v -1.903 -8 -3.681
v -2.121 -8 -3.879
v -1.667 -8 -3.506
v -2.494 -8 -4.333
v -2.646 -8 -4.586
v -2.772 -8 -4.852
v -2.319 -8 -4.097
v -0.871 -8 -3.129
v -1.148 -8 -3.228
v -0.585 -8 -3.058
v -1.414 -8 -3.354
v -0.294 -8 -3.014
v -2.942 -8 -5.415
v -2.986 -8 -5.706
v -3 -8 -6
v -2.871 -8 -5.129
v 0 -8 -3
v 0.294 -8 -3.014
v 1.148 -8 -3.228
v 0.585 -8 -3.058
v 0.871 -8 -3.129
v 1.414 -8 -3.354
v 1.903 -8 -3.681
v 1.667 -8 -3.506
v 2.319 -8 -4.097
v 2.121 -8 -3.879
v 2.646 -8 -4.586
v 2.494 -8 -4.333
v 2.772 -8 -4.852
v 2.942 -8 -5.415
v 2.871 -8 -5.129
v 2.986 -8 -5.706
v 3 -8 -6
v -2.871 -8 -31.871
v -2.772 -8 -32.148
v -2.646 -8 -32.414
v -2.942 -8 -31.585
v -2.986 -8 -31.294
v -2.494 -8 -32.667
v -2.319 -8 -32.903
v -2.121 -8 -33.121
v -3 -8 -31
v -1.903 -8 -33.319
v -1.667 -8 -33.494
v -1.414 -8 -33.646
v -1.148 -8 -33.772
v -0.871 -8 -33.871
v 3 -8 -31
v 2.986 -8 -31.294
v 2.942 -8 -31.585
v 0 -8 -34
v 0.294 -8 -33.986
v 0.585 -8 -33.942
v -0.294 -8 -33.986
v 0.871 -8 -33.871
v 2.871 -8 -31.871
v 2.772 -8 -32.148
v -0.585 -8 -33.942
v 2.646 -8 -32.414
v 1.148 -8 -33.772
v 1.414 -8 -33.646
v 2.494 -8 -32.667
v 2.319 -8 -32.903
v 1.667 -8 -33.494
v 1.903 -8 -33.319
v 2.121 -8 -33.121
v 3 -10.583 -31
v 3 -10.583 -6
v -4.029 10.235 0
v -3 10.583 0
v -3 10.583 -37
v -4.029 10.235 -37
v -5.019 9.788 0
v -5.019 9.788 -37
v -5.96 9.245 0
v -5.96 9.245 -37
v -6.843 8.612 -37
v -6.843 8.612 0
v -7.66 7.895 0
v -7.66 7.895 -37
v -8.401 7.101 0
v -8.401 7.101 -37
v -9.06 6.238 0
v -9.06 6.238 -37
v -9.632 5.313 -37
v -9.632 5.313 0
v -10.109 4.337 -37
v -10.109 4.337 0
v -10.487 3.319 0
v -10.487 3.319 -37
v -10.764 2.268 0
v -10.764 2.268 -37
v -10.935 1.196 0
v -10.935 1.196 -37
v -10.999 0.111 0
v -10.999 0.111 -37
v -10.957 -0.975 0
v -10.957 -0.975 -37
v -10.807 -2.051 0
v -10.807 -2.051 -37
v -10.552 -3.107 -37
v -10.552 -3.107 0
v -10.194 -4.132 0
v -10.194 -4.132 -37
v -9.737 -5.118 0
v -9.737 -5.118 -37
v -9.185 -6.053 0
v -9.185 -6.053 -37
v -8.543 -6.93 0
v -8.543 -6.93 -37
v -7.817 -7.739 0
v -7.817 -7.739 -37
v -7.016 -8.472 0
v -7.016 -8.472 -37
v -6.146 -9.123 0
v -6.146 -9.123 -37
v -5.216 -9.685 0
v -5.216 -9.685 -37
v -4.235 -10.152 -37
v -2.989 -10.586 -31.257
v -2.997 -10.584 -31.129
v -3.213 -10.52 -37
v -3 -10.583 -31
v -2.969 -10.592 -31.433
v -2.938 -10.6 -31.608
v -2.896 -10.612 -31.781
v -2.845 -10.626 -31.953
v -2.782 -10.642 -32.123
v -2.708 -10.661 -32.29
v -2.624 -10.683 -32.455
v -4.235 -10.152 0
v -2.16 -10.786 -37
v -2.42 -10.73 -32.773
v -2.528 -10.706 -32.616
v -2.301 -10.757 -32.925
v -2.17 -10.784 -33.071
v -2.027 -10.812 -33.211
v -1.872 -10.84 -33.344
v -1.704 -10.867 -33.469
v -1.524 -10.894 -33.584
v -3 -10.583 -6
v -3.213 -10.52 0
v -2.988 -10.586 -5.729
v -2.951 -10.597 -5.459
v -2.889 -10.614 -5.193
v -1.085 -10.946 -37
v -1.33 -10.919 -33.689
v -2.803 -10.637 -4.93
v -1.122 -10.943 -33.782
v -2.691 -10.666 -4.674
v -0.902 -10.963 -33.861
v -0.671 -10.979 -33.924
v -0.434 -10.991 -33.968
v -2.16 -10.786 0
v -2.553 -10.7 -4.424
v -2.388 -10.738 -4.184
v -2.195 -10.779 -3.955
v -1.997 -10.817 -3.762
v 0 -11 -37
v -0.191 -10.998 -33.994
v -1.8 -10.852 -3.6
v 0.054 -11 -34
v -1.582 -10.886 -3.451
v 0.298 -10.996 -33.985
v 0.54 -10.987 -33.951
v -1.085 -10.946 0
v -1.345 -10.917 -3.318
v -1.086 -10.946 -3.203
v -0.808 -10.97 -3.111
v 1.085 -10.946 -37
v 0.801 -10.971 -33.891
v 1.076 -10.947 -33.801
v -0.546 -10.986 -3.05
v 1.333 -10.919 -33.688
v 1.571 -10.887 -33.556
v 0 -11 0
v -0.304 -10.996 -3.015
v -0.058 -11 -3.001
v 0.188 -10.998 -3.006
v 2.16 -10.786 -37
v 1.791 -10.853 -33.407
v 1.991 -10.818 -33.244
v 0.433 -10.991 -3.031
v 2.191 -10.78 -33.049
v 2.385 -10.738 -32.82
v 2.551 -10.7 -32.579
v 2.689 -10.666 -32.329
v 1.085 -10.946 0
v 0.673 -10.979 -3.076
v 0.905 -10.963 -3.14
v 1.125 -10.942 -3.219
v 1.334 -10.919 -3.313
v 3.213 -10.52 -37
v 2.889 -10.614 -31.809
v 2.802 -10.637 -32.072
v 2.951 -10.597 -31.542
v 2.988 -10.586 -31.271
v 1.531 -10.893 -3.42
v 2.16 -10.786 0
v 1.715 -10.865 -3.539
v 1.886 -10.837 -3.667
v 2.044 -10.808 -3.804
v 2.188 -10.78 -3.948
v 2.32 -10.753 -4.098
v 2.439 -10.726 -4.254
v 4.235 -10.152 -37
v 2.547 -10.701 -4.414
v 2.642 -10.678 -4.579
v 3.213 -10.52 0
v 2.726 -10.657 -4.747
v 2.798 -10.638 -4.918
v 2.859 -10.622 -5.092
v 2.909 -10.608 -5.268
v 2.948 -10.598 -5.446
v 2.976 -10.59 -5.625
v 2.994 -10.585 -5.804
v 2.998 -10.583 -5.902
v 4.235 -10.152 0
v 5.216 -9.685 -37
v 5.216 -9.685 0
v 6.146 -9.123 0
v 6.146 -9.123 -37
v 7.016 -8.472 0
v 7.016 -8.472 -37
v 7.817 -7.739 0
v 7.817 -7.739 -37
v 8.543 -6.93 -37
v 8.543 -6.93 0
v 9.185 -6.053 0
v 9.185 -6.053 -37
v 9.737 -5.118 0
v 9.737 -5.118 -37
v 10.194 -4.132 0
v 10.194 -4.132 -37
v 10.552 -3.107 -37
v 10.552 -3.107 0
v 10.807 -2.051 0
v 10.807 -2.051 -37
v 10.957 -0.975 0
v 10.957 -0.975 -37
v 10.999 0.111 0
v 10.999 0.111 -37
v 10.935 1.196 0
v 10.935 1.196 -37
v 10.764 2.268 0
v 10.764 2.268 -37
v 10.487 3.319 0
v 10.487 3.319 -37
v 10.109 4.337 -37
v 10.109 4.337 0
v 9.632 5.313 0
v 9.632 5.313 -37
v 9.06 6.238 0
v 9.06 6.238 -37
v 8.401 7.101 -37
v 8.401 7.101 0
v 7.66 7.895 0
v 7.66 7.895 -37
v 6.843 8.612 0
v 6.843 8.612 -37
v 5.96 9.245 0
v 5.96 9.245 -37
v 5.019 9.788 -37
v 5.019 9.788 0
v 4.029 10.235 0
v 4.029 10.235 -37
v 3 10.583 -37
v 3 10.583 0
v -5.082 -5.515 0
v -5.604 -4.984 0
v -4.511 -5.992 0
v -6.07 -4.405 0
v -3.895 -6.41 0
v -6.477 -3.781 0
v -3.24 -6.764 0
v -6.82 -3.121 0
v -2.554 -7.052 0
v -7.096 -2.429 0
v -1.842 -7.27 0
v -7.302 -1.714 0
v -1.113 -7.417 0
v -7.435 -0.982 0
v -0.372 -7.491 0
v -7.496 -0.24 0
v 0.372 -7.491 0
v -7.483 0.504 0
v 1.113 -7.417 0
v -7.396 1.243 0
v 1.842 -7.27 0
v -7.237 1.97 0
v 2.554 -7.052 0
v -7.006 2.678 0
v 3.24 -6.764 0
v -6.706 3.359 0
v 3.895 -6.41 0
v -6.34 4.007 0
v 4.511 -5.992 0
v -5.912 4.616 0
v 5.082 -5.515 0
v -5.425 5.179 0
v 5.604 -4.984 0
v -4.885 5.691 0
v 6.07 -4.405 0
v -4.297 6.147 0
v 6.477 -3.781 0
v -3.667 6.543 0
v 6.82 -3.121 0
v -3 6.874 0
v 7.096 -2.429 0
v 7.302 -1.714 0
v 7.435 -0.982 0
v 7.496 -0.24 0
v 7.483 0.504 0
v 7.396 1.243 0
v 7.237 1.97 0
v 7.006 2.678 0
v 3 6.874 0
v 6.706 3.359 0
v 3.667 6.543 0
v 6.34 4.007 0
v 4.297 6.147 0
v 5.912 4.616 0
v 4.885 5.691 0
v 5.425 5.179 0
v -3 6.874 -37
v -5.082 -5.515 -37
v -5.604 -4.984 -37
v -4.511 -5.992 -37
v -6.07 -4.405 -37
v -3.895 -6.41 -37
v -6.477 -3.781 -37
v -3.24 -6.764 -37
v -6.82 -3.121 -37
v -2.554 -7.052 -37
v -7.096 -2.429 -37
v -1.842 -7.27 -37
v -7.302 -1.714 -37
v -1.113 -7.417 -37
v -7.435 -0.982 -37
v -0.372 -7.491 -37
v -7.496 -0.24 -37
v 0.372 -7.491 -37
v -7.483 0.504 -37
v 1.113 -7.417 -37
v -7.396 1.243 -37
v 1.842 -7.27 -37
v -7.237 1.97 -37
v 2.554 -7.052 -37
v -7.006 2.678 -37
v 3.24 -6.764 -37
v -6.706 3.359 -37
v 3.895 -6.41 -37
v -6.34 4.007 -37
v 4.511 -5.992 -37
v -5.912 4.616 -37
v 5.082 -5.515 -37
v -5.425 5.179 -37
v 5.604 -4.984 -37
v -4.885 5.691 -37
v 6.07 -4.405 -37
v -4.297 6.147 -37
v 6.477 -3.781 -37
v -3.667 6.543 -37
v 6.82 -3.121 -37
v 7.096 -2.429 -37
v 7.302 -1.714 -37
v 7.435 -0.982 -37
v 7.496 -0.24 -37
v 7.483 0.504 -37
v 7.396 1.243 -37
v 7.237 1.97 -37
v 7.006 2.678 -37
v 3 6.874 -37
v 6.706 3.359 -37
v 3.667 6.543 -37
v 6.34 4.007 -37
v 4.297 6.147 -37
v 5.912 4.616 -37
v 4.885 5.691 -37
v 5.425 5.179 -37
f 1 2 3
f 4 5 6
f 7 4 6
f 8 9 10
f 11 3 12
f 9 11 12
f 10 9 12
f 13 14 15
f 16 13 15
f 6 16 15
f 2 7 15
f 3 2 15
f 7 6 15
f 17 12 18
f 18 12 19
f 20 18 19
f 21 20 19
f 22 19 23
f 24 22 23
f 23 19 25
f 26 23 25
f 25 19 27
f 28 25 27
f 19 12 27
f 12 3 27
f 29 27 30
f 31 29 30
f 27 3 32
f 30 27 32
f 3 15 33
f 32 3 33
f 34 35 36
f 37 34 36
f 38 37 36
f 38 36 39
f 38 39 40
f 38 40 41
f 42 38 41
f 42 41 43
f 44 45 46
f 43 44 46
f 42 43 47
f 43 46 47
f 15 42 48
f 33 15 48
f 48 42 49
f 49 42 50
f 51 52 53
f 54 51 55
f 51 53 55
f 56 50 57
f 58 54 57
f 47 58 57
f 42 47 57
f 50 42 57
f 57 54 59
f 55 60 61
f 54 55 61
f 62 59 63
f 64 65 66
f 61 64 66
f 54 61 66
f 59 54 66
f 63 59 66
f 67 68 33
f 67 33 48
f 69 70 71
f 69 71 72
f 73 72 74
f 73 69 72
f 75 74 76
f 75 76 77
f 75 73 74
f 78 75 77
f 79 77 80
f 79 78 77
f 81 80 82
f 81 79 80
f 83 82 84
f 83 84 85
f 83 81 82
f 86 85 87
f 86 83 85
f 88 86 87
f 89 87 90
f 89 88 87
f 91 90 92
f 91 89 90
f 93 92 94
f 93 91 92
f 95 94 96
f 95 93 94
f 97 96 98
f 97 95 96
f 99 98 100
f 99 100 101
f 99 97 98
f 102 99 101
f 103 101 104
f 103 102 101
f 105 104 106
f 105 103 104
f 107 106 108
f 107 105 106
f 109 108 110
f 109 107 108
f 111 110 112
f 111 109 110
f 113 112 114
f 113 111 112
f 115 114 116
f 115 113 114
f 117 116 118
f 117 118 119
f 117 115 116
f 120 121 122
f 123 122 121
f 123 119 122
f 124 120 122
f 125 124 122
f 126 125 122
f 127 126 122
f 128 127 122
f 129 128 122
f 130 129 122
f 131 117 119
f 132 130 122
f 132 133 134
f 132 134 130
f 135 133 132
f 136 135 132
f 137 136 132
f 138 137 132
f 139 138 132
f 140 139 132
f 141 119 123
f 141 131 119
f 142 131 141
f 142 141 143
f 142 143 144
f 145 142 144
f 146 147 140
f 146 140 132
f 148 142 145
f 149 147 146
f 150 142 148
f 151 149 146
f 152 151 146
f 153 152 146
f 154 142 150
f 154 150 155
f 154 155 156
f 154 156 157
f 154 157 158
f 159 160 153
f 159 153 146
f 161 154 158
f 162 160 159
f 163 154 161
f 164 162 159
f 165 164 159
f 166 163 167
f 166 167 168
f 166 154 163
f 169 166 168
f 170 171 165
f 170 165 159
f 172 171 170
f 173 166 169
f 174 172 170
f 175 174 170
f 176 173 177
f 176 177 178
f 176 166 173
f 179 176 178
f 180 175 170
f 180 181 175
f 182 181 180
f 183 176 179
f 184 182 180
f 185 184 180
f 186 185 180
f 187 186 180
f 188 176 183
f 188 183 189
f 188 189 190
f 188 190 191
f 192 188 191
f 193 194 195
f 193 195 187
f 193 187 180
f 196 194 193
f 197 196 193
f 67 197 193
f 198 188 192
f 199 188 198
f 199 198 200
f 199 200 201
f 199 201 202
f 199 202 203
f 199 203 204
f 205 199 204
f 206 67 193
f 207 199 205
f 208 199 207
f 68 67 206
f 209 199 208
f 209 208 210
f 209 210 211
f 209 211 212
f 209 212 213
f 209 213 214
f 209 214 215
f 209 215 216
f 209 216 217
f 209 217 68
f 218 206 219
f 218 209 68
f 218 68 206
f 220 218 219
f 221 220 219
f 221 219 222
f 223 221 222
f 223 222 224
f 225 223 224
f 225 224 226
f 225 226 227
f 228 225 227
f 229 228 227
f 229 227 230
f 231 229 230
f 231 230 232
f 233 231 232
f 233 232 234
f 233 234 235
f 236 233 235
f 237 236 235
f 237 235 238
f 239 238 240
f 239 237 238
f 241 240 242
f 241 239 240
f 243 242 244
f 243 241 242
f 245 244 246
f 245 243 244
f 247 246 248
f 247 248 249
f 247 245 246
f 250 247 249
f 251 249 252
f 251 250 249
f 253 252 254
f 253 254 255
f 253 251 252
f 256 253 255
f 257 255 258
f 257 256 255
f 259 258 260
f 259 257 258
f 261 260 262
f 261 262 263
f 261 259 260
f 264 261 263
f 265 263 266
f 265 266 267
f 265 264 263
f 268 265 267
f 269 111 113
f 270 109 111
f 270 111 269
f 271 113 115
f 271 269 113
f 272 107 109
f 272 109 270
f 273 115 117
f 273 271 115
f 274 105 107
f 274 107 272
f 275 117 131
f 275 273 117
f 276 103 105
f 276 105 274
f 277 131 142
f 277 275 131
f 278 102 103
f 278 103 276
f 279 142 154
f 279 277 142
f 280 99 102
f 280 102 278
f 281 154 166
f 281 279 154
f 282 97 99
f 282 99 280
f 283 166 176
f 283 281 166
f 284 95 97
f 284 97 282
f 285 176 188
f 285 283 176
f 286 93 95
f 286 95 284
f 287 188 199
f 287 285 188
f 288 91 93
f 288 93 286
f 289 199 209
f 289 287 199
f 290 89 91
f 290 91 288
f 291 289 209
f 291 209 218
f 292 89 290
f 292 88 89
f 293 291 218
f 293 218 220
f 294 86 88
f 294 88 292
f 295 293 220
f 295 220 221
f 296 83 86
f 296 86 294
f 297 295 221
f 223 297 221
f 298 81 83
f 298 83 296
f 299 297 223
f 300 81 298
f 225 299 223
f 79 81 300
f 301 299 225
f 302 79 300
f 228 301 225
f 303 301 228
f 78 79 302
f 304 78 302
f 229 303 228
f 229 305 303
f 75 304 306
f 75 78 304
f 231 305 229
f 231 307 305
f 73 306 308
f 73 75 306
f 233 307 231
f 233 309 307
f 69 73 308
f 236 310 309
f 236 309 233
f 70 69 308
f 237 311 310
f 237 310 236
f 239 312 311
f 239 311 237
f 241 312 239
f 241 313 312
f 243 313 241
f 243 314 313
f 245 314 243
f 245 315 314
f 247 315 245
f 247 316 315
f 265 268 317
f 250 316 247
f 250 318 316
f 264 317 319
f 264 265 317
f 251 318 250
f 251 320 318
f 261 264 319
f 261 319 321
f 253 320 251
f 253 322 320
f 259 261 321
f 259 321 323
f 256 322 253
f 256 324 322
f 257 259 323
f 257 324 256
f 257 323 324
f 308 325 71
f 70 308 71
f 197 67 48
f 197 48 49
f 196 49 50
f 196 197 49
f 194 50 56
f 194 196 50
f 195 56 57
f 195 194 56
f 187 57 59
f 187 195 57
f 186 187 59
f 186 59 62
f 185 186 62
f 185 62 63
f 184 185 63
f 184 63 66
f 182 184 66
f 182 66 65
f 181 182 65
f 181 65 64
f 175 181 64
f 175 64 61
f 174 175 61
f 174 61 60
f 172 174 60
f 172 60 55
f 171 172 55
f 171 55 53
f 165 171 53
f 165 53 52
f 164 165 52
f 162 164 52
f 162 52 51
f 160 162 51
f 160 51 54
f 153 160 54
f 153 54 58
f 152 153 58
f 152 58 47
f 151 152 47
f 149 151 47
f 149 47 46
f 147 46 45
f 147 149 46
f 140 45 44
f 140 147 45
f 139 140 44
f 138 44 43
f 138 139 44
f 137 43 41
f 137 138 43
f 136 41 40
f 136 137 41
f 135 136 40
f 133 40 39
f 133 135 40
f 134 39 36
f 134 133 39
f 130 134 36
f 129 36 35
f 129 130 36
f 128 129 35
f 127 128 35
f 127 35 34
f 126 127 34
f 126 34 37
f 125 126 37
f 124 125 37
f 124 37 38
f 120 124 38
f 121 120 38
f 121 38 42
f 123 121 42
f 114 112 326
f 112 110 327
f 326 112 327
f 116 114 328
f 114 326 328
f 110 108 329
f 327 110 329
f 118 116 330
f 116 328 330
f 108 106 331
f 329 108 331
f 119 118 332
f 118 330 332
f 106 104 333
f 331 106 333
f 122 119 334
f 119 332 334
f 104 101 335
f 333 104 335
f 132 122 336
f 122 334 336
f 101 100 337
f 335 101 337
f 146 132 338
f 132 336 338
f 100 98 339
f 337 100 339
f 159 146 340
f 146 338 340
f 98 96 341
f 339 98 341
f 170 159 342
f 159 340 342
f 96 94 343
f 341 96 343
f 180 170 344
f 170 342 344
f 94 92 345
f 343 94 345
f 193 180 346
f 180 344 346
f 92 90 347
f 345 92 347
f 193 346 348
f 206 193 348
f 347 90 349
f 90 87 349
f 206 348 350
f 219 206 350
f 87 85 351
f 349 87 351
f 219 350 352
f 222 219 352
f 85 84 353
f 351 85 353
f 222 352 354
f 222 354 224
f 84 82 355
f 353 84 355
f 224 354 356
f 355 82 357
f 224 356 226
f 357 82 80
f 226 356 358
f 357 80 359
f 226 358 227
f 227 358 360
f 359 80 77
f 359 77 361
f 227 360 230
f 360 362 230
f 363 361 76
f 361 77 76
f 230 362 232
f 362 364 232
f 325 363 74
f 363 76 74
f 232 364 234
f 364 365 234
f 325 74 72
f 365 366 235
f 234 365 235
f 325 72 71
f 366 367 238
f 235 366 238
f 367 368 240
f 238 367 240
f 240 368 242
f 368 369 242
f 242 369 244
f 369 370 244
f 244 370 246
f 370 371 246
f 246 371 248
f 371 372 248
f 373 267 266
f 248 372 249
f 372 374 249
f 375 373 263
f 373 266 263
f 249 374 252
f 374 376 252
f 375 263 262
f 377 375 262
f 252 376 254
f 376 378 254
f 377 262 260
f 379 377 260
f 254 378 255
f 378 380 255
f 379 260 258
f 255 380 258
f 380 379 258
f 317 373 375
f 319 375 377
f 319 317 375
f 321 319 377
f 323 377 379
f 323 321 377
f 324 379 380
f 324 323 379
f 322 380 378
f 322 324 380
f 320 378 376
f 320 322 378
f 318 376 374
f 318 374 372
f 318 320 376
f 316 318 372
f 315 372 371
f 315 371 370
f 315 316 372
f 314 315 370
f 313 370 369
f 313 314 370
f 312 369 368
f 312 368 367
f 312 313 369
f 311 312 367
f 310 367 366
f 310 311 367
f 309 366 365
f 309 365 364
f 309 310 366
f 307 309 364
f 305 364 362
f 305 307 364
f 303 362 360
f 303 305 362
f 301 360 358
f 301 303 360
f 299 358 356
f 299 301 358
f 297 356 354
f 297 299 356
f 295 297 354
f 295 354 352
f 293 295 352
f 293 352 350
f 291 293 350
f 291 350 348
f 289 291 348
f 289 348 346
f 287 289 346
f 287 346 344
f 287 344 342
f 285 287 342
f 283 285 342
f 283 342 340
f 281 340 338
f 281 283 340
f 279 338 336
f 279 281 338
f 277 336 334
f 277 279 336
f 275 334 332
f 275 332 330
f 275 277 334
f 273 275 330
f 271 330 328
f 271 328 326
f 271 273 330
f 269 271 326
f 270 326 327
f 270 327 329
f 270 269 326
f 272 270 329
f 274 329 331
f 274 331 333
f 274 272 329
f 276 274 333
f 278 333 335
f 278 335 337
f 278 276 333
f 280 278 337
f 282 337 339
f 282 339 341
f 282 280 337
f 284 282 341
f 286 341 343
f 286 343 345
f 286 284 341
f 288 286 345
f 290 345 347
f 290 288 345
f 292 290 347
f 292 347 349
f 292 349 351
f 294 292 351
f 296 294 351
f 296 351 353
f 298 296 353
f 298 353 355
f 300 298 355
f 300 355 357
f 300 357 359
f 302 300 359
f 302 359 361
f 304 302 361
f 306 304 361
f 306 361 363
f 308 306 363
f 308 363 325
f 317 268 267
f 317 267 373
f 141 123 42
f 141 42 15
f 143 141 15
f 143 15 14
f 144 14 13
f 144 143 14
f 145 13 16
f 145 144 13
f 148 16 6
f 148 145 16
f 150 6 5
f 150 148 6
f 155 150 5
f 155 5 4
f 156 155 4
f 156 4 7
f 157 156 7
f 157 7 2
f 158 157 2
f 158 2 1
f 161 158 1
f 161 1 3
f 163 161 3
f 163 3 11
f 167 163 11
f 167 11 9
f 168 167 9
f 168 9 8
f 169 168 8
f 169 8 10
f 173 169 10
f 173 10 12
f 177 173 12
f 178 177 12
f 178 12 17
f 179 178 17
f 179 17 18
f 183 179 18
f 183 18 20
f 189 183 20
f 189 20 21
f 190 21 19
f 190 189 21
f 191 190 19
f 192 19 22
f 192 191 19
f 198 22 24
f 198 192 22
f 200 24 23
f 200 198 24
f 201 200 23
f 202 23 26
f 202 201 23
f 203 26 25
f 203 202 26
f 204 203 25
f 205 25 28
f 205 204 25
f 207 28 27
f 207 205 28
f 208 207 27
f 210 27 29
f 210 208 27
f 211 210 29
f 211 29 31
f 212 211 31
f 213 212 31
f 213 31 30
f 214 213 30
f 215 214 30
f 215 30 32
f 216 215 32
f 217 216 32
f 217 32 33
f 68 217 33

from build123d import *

# Parameters (mm, degrees)
EXTRUDE_1_DEPTH     = 37
CUT_EXTRUDE_1_DEPTH = 3


with BuildPart() as part:
    # Эскиз1 → Бобышка-Вытянуть1 (new body)
    with BuildSketch(Plane.XY):
        with BuildLine():
            Line((-3, 6.873863542), (-3, 10.583005244))
            ThreePointArc((-3, 10.583005244), (0, -11), (3, 10.583005244))
            Line((3, 10.583005244), (3, 6.873863542))
            ThreePointArc((3, 6.873863542), (0, -7.5), (-3, 6.873863542))
        make_face()
    extrude(amount=-EXTRUDE_1_DEPTH)

    # Эскиз2 → Вырез-Вытянуть1 (cut)
    with BuildSketch(Plane(origin=(0, -11, 0), x_dir=(-1, 0, 0), z_dir=(0, -1, 0))):
        with BuildLine():
            Line((3, 31), (3, 6))
            ThreePointArc((3, 6), (0, 3), (-3, 6))
            Line((-3, 6), (-3, 31))
            ThreePointArc((-3, 31), (0, 34), (3, 31))
        make_face()
    extrude(amount=-CUT_EXTRUDE_1_DEPTH, mode=Mode.SUBTRACT)


solid = part.part
